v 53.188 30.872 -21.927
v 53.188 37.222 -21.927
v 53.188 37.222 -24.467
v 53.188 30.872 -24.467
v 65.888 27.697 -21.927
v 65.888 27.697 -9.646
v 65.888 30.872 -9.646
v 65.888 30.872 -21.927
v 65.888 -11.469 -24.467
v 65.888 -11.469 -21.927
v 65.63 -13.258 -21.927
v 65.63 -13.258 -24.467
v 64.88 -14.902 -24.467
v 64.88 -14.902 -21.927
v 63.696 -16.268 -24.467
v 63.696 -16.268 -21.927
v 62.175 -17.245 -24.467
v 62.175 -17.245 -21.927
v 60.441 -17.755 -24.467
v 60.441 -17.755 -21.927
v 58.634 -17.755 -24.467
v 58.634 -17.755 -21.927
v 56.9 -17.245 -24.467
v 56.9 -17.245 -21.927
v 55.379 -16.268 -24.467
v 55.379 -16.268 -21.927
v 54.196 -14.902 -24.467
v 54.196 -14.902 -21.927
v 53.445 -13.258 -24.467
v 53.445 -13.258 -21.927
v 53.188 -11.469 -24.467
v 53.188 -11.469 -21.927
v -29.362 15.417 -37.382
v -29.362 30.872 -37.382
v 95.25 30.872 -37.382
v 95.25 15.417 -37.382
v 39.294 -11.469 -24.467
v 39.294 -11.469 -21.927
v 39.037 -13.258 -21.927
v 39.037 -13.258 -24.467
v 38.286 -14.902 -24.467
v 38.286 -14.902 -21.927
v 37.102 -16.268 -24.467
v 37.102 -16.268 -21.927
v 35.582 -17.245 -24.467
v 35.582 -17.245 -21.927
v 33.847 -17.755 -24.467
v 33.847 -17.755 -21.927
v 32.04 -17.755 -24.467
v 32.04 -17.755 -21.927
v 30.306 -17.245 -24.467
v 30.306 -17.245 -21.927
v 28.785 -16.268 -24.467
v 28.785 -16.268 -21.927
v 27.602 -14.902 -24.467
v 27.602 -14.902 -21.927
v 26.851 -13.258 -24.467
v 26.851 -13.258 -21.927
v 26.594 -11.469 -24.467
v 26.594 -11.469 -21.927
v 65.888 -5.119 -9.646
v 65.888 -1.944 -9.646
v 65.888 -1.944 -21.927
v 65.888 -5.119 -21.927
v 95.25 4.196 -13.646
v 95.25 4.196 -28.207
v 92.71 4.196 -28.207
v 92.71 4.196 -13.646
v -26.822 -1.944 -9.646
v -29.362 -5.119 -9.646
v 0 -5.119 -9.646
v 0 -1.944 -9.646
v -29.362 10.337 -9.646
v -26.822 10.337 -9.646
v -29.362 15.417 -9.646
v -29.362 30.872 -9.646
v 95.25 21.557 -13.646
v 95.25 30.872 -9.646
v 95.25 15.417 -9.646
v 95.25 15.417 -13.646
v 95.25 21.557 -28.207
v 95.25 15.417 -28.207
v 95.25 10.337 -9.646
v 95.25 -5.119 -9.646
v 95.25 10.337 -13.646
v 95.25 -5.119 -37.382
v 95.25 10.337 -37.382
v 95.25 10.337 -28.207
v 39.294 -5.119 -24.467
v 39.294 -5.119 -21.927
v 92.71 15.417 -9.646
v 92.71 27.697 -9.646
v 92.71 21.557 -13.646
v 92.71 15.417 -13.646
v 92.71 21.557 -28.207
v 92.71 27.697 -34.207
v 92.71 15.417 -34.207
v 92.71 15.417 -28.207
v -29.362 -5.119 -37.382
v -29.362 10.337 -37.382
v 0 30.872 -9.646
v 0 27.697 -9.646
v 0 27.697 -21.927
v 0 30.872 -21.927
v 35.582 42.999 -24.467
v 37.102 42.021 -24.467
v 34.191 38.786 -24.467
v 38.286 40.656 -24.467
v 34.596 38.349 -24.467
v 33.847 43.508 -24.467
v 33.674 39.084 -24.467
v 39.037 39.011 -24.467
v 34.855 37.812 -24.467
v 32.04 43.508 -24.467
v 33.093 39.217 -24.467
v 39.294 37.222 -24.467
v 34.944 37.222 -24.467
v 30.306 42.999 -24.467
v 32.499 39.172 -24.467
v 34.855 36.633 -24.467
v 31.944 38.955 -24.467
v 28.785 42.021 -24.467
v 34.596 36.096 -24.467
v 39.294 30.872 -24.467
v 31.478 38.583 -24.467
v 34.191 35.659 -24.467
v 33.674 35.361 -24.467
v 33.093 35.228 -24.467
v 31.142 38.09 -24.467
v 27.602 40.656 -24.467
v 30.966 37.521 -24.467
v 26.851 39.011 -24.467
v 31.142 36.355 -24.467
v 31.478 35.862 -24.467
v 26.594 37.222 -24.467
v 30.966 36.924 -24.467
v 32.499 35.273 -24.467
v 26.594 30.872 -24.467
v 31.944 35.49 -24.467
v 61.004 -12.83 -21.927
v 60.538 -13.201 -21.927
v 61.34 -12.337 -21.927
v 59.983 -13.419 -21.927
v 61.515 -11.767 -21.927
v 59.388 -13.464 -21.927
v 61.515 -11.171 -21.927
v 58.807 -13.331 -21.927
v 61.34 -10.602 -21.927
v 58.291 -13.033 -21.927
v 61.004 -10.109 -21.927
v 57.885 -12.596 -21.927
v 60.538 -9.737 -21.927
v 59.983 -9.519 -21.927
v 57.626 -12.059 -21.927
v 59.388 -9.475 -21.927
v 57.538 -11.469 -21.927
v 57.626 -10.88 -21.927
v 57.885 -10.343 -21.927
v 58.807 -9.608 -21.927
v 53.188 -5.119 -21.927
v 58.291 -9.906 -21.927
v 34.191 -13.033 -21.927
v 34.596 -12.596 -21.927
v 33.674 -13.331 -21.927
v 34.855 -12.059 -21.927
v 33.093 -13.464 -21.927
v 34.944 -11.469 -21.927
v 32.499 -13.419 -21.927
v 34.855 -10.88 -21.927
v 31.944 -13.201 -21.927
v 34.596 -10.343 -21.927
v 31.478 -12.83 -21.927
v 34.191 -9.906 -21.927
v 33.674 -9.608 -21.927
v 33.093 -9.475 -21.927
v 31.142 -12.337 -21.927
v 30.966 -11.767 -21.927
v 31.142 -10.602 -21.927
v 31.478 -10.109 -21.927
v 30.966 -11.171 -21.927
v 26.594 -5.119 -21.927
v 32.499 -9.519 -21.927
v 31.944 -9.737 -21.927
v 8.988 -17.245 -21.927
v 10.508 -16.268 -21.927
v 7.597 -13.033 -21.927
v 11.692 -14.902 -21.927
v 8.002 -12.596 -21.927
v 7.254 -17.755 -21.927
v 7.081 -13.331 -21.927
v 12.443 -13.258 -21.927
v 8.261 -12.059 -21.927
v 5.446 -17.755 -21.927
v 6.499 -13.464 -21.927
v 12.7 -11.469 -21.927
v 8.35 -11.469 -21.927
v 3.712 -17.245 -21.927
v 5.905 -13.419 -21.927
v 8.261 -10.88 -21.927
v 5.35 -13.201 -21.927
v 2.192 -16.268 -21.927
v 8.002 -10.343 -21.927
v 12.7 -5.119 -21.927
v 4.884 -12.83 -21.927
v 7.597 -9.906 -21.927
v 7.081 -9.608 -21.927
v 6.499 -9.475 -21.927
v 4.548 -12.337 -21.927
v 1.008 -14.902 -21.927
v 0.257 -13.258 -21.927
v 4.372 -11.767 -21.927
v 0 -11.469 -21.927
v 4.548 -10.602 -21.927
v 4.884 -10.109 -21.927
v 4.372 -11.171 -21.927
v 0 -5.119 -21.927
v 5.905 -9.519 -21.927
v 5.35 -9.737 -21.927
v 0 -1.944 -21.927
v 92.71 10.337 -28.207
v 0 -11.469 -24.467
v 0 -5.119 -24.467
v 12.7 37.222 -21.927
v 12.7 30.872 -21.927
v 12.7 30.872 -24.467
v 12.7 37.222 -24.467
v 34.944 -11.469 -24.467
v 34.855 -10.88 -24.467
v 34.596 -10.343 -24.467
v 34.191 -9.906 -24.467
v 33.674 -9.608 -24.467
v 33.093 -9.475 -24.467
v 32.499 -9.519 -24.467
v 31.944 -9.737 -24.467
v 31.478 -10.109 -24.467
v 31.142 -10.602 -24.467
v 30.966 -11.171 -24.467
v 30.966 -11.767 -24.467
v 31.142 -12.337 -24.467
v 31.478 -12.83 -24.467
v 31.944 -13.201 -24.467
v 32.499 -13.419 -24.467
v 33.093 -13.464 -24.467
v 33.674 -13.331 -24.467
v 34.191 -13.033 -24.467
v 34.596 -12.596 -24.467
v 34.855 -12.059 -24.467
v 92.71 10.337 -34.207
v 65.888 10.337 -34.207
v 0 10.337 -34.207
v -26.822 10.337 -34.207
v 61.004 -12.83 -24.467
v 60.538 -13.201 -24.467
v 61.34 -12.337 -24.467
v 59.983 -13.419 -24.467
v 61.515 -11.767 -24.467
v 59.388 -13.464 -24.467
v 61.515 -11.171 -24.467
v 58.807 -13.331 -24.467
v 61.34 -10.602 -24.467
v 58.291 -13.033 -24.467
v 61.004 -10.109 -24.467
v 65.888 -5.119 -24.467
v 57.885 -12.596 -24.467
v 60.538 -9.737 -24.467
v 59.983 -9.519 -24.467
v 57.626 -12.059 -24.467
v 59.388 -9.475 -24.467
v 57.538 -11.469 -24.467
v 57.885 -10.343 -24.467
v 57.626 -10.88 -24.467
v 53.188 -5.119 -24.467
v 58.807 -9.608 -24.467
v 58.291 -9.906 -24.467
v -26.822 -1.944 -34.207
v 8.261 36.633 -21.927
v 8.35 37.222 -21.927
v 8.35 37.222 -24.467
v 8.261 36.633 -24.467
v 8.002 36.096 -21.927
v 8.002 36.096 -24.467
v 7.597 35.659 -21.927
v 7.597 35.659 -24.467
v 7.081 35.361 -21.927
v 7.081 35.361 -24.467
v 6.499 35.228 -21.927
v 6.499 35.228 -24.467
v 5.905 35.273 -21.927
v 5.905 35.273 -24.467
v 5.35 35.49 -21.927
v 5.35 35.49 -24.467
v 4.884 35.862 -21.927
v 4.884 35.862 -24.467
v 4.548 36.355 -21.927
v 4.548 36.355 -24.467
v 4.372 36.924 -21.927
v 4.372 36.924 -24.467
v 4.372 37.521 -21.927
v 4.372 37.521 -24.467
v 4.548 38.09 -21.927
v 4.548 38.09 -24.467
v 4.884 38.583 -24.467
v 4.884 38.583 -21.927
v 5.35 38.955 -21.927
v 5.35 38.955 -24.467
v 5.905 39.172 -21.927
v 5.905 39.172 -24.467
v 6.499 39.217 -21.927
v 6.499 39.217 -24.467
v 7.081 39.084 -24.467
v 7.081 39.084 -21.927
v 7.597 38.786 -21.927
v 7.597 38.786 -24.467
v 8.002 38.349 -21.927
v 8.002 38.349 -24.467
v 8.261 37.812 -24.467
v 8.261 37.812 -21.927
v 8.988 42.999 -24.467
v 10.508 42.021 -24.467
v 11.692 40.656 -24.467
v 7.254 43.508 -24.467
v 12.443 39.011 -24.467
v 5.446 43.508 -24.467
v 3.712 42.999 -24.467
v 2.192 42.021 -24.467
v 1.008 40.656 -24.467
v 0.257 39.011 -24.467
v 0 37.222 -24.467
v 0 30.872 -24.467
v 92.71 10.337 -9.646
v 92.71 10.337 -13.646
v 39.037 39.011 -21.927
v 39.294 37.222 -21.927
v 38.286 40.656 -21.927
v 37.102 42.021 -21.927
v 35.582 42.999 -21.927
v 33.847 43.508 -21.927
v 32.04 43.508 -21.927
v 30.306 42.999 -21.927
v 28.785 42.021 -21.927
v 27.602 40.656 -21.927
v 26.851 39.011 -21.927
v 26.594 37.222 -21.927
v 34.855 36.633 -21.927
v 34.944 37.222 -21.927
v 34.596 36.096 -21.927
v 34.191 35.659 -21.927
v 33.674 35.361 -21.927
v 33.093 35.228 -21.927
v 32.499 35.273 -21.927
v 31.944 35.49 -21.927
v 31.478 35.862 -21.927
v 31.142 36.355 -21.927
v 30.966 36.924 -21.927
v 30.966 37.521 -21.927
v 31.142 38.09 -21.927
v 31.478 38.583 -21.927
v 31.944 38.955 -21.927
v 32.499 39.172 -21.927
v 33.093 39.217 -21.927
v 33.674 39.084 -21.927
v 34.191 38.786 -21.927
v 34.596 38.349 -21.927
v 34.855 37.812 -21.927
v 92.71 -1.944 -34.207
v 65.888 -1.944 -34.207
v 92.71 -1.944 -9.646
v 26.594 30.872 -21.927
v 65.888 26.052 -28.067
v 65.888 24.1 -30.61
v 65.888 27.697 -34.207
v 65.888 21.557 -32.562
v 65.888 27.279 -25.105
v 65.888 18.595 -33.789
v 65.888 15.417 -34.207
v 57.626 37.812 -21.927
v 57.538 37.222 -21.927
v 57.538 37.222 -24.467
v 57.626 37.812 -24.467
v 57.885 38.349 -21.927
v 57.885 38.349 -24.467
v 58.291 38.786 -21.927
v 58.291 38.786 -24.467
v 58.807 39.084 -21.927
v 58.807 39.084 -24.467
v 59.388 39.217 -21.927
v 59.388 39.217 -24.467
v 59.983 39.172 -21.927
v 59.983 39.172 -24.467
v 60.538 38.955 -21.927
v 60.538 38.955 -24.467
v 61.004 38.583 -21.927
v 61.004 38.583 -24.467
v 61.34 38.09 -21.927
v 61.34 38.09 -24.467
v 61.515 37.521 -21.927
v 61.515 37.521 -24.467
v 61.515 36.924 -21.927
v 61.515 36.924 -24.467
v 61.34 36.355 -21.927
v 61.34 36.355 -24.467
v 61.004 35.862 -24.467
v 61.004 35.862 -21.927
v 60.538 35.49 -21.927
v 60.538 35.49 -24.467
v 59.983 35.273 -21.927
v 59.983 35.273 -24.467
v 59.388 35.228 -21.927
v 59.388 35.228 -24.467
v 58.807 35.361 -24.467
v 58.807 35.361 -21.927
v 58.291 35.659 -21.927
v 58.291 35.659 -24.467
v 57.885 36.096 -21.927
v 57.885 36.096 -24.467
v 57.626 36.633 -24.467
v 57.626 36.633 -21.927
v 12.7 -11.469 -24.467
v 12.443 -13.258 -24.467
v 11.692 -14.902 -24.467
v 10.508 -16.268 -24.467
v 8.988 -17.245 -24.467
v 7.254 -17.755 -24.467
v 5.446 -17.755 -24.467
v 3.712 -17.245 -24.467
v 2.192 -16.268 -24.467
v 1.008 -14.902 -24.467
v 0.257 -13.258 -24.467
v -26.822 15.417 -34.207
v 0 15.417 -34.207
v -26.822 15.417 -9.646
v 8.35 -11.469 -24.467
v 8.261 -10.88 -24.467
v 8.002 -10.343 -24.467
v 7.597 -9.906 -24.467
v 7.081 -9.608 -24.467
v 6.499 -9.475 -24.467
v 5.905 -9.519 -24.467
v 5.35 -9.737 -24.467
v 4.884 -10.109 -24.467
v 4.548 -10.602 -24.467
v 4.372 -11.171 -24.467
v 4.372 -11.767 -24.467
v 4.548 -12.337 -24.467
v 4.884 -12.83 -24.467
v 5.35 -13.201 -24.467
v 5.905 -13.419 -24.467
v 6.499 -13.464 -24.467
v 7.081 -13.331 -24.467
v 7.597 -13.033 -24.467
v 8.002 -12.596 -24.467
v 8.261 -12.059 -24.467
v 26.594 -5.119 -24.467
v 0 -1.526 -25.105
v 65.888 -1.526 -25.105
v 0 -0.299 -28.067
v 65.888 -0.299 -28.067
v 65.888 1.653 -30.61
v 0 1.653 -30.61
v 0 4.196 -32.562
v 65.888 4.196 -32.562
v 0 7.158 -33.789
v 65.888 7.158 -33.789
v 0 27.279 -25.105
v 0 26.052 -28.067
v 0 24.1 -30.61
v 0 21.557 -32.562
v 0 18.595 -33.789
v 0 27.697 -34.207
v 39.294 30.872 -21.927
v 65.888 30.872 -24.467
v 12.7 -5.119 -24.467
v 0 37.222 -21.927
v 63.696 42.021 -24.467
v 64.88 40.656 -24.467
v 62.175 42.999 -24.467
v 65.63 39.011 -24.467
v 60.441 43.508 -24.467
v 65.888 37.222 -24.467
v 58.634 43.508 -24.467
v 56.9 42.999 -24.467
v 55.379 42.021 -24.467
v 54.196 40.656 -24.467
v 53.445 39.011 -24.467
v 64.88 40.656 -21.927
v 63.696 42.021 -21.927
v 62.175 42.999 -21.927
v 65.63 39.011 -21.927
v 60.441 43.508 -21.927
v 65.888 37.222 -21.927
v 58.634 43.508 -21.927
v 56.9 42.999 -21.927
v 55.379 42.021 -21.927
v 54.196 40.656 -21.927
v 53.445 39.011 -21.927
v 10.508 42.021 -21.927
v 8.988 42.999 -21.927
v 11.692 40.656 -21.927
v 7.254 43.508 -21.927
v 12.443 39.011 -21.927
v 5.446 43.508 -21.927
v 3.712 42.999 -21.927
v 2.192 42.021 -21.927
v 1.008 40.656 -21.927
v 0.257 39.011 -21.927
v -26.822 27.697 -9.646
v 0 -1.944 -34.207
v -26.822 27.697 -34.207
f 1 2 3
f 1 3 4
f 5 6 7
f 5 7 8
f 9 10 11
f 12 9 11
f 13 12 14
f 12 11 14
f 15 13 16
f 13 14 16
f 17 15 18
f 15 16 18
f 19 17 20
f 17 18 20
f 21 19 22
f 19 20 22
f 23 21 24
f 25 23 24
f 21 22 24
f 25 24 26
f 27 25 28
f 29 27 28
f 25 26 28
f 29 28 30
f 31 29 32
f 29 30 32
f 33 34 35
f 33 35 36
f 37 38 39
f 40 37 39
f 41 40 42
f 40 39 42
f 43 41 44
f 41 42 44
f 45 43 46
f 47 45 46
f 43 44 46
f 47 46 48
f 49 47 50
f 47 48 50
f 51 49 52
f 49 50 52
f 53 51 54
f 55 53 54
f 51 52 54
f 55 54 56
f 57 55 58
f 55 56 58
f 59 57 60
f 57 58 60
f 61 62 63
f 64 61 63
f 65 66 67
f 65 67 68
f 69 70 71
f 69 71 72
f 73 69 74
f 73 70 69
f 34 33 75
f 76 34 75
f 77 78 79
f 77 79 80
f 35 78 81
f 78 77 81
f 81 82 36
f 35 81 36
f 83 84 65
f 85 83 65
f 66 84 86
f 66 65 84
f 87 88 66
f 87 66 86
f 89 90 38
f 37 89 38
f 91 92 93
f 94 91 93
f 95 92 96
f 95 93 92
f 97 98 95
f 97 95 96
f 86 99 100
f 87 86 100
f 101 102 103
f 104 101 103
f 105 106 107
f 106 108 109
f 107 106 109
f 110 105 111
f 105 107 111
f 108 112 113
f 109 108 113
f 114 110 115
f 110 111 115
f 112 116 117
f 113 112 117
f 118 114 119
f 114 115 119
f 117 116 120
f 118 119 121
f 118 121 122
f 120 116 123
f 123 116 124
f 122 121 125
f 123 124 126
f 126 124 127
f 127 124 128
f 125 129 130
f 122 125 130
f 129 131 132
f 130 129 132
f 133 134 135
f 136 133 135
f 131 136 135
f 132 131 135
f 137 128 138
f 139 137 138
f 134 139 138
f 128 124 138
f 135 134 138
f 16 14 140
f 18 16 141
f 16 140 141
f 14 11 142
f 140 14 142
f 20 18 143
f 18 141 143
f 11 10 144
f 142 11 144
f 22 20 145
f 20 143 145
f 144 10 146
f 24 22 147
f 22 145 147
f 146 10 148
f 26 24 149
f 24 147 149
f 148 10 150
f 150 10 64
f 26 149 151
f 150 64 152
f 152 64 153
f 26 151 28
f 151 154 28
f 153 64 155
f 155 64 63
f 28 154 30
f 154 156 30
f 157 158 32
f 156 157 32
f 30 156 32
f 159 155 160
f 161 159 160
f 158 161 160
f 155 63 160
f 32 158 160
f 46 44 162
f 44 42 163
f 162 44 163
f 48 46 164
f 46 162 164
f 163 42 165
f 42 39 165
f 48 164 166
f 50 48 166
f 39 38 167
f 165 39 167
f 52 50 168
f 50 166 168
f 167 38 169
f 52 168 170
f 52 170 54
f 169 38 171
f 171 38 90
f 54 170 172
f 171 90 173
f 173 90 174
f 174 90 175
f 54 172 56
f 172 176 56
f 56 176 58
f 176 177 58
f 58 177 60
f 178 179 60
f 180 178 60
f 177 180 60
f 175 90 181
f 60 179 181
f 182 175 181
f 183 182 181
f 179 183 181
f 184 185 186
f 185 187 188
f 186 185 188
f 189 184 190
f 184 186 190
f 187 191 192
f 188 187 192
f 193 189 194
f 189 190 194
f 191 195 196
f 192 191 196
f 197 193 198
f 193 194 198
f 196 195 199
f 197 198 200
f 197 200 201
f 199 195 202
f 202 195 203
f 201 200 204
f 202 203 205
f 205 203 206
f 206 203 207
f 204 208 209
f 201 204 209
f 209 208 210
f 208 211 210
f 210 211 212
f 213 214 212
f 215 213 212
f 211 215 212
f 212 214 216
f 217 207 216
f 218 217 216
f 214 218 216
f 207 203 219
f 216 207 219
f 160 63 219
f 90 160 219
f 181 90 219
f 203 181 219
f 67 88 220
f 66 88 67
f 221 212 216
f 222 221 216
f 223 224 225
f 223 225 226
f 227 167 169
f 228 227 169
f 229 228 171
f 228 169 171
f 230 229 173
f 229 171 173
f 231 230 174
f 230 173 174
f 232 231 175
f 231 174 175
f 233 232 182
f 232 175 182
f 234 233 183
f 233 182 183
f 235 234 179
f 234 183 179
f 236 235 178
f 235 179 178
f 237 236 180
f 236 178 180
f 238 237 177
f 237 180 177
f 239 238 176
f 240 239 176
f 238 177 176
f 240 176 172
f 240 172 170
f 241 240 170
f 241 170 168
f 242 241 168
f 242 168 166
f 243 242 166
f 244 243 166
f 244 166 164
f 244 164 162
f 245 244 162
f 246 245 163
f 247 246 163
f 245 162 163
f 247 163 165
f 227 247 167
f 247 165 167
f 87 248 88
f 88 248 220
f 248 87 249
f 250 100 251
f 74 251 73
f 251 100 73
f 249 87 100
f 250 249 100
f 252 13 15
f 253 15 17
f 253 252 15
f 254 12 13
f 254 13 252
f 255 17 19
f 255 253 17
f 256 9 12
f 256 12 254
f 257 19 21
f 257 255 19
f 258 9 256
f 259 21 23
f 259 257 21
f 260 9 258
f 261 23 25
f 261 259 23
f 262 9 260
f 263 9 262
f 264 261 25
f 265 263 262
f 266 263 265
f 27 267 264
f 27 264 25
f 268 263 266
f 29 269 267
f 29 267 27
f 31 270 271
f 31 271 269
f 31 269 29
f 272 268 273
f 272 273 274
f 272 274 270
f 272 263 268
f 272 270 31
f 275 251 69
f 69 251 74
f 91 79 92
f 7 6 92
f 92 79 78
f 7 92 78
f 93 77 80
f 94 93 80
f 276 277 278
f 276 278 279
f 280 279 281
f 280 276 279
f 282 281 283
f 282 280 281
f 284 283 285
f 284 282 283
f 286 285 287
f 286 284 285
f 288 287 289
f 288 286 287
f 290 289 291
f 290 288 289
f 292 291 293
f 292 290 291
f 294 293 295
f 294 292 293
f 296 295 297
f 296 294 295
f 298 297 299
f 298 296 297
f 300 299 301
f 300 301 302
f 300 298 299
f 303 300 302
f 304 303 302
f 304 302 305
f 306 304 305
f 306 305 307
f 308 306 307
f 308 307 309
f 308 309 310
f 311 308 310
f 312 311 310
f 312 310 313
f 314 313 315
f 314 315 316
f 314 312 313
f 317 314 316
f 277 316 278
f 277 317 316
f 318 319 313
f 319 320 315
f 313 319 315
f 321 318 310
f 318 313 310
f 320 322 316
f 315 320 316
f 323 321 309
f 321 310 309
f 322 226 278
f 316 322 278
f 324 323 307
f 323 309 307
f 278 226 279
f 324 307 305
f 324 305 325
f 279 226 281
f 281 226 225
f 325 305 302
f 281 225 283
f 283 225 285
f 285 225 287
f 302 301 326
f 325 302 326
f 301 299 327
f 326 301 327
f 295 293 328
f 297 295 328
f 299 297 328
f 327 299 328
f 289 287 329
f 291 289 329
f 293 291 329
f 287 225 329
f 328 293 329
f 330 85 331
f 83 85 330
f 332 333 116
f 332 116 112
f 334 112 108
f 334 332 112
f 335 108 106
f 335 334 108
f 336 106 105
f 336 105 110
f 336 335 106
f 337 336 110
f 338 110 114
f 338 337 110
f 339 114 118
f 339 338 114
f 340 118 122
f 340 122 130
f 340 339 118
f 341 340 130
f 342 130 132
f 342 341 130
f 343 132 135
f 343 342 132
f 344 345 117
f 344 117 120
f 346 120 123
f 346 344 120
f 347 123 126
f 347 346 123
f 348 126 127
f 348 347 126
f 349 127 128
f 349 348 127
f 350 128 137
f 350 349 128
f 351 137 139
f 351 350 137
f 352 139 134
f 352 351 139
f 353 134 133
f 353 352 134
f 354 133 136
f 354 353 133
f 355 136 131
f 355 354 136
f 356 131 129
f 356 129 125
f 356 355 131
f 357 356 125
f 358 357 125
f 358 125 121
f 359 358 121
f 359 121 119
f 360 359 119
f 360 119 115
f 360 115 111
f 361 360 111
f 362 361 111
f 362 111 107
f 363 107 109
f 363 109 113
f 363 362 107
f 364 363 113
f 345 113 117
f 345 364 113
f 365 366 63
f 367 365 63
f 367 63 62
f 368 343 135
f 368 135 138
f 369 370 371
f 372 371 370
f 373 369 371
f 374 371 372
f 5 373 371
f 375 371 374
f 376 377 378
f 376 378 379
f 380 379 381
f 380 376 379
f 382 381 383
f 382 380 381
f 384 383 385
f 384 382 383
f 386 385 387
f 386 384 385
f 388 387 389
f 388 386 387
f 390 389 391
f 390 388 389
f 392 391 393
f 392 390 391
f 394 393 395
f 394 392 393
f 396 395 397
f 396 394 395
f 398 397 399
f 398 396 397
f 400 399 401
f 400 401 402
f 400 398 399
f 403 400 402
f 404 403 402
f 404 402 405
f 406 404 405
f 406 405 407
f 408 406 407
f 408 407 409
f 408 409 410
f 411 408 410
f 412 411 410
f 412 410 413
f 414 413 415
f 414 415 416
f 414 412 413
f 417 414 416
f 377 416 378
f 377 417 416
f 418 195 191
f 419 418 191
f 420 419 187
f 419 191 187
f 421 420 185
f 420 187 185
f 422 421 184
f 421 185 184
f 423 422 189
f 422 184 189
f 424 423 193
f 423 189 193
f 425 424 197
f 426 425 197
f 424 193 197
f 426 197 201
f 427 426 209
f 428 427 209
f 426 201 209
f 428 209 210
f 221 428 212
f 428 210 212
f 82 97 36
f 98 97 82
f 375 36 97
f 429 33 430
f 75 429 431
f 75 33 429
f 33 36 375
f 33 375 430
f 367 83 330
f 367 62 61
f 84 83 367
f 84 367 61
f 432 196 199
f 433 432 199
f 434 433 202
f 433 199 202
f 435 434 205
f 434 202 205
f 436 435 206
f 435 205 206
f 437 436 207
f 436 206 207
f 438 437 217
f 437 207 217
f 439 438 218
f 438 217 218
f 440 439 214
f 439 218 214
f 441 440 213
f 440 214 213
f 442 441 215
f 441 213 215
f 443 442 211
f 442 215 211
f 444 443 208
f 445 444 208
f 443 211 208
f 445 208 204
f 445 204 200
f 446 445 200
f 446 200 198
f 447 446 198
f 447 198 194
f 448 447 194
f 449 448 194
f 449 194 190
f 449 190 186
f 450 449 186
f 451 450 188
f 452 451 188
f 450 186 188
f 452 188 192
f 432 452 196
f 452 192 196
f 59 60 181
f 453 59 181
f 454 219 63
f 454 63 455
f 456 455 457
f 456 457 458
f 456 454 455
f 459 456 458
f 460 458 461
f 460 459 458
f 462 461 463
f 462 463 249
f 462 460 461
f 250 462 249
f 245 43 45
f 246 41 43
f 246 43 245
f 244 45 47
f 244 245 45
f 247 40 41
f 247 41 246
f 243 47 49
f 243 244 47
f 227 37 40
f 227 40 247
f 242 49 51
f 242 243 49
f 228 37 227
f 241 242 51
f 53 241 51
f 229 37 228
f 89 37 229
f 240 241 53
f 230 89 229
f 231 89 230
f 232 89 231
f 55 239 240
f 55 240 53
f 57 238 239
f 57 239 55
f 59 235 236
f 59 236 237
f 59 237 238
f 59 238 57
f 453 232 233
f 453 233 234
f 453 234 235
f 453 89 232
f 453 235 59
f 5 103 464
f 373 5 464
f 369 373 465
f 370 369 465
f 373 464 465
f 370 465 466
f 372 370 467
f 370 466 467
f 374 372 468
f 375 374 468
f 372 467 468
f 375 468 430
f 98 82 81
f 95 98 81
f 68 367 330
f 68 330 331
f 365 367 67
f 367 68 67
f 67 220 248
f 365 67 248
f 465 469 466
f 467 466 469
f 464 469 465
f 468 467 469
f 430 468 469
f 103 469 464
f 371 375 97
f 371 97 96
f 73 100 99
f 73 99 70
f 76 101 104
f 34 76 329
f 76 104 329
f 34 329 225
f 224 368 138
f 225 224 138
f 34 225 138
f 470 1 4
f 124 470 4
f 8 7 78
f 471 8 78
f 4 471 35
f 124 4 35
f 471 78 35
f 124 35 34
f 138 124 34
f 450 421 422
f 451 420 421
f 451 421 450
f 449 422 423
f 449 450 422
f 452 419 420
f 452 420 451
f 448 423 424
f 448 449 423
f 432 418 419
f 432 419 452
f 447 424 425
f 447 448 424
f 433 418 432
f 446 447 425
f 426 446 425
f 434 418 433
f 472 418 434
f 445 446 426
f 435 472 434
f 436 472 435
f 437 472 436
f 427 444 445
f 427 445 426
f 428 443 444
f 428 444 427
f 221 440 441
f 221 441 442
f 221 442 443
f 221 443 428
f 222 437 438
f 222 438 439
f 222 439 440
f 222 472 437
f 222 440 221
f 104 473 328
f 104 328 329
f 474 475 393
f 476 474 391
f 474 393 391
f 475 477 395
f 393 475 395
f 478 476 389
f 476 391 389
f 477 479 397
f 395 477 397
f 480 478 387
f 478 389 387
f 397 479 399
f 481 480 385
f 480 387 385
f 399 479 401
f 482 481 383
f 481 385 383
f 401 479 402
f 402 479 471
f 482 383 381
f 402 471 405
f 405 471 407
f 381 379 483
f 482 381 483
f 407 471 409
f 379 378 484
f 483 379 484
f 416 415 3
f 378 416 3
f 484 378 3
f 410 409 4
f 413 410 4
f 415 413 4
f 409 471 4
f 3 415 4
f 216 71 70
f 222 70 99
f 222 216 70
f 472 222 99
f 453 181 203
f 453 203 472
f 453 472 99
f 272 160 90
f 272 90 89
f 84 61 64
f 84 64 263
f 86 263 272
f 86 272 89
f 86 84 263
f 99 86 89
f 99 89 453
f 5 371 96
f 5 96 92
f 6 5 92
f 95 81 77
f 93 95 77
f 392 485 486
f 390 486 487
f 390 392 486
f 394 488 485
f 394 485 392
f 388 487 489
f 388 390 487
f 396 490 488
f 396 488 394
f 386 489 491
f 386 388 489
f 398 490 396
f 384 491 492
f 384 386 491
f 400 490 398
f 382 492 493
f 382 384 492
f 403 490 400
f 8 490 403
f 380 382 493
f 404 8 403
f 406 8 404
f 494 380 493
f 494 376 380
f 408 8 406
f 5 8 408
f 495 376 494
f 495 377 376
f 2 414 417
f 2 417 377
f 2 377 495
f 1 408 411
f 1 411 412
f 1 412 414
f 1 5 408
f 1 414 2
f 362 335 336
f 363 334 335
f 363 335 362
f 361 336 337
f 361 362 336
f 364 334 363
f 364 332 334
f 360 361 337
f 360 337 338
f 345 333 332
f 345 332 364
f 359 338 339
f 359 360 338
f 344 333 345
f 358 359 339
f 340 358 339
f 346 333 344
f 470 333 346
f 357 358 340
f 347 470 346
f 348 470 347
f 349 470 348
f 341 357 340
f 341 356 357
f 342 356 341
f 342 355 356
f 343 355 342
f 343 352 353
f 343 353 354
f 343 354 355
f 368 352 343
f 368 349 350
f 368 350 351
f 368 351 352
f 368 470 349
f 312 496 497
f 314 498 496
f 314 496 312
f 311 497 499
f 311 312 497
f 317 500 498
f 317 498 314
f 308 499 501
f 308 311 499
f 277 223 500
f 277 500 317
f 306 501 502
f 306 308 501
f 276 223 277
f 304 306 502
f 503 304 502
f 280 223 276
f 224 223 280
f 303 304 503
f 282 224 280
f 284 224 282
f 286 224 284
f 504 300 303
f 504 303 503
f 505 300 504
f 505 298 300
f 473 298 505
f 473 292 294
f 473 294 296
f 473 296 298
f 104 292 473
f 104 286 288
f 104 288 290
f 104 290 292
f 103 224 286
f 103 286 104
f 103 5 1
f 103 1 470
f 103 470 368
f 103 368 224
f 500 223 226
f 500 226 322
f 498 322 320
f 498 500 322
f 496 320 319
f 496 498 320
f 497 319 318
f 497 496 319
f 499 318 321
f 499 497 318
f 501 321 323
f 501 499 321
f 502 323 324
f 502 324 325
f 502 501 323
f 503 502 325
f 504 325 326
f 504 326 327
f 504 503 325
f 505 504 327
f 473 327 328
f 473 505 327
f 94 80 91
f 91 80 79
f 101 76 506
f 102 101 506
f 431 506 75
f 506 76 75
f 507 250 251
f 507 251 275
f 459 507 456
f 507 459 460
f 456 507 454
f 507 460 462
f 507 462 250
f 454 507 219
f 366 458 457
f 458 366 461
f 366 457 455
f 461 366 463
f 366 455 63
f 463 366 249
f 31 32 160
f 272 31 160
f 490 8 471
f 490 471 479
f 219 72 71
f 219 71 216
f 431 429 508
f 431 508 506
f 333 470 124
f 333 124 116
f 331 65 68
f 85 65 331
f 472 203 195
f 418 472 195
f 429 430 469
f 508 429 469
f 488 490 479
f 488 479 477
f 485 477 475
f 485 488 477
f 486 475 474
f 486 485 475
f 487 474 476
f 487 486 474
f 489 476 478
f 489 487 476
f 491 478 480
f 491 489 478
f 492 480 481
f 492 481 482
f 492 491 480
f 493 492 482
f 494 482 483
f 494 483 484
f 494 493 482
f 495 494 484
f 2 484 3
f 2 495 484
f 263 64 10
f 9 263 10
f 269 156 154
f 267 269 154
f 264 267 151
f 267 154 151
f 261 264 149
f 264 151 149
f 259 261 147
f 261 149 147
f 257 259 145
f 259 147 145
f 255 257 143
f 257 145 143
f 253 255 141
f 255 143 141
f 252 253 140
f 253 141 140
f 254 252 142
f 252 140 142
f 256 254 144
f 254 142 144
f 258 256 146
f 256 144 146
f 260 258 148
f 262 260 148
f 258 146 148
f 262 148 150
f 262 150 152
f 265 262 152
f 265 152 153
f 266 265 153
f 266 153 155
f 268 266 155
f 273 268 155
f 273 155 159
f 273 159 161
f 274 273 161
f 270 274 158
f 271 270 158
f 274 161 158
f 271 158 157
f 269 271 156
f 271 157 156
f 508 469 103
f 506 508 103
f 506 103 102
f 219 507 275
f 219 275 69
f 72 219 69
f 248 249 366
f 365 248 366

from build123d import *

# Parameters (mm, degrees)
BOSS_EXTRUDE1_DEPTH = 65.8876
BOSS_EXTRUDE2_DEPTH = 29.3624
BOSS_EXTRUDE3_DEPTH = 2.54
SKETCH4_R           = 2
BOSS_EXTRUDE4_DEPTH = 2.54
SKETCH6_W           = 24.561
SKETCH6_H           = 12.2809
BOSS_EXTRUDE5_DEPTH = 2.54


with BuildPart() as part:
    # Sketch1 → Boss-Extrude1 (new body)
    with BuildSketch(Plane(origin=(0, 0, 0), x_dir=(0, 0, -1), z_dir=(1, 0, 0))):
        with BuildLine():
            Line((34.207401555, 10.336569156), (37.382401555, 10.336569156))
            Line((37.382401555, 10.336569156), (37.382401555, -5.119330844))
            Line((37.382401555, -5.119330844), (21.926501555, -5.119330844))
            Line((21.926501555, -5.119330844), (21.926501555, -1.944330844))
            ThreePointArc((21.926501555, -1.944330844), (30.610409224, 1.652661487), (34.207401555, 10.336569156))
        make_face()
    extrude(amount=BOSS_EXTRUDE1_DEPTH)

    # Sketch2 → Boss-Extrude2 (add)
    with BuildSketch(Plane(origin=(65.8876, 0, 0), x_dir=(0, 0, -1), z_dir=(1, 0, 0))):
        Polygon((37.382401555, -1.944330844), (37.382401555, 10.336569156), (34.207401555, 10.336569156), (34.207401555, -1.944330844), (9.646401555, -1.944330844), (9.646401555, -5.119330844), (37.382401555, -5.119330844), align=None)
    boss_extrude2 = extrude(amount=BOSS_EXTRUDE2_DEPTH)

    # Sketch3 → Boss-Extrude3 (add)
    with BuildSketch(Plane(origin=(95.25, 0, 0), x_dir=(0, 0, -1), z_dir=(1, 0, 0))):
        Polygon((28.207401555, 4.196119156), (13.646401555, 4.196119156), (13.646401555, 10.336569156), (9.646401555, 10.336569156), (9.646401555, 4.196119156), (9.646401555, -1.944330844), (28.207401555, -1.944330844), (34.207401555, -1.944330844), (34.207401555, 10.336569156), (28.207401555, 10.336569156), align=None)
    extrude(amount=-BOSS_EXTRUDE3_DEPTH)

    # Sketch4 → Boss-Extrude4 (add)
    # profile 1 of 3: a face of its own
    with BuildSketch(Plane.XY.offset(-21.926501555)):
        with BuildLine():
            Line((0, -11.469330844), (0, -5.119330844))
            Line((0, -5.119330844), (12.7, -5.119330844))
            Line((12.7, -5.119330844), (12.7, -11.469330844))
            ThreePointArc((12.7, -11.469330844), (6.35, -17.819330844), (0, -11.469330844))
        make_face()
        with Locations((6.35, -11.469330844)):
            Circle(SKETCH4_R, mode=Mode.SUBTRACT)
    # profile 2 of 3: a face of its own
    with BuildSketch(Plane.XY.offset(-21.926501555)):
        with BuildLine():
            Line((26.5938, -11.469330844), (26.5938, -5.119330844))
            Line((26.5938, -5.119330844), (39.2938, -5.119330844))
            Line((39.2938, -5.119330844), (39.2938, -11.469330844))
            ThreePointArc((39.2938, -11.469330844), (32.9438, -17.819330844), (26.5938, -11.469330844))
        make_face()
        with Locations((32.9438, -11.469330844)):
            Circle(SKETCH4_R, mode=Mode.SUBTRACT)
    # profile 3 of 3: a face of its own
    with BuildSketch(Plane.XY.offset(-21.926501555)):
        with BuildLine():
            Line((53.1876, -5.119330844), (65.8876, -5.119330844))
            Line((65.8876, -5.119330844), (65.8876, -11.469330844))
            ThreePointArc((65.8876, -11.469330844), (59.5376, -17.819330844), (53.1876, -11.469330844))
            Line((53.1876, -11.469330844), (53.1876, -5.119330844))
        make_face()
        with Locations(Location((59.5376, -11.469330844, 0), (0, 0, 180))):
            Circle(SKETCH4_R, mode=Mode.SUBTRACT)
    extrude(amount=-BOSS_EXTRUDE4_DEPTH)

    # Mirror1: Boss-Extrude2 across plane
    add(boss_extrude2.mirror(Plane(origin=(32.9438, 0, 0), x_dir=(0, 0, 1), z_dir=(1, 0, 0))))

    # Sketch6 → Boss-Extrude5 (add)
    with BuildSketch(Plane.ZY.offset(29.3624)):
        with Locations((-21.926901555, 4.196119156)):
            Rectangle(SKETCH6_W, SKETCH6_H)
    extrude(amount=-BOSS_EXTRUDE5_DEPTH)


with BuildPart() as body_2:
    # Mirror3: mirrored copy
    add(part.part.mirror(Plane.ZX.offset(12.876569156)))


solid = Compound([part.part, body_2.part])
